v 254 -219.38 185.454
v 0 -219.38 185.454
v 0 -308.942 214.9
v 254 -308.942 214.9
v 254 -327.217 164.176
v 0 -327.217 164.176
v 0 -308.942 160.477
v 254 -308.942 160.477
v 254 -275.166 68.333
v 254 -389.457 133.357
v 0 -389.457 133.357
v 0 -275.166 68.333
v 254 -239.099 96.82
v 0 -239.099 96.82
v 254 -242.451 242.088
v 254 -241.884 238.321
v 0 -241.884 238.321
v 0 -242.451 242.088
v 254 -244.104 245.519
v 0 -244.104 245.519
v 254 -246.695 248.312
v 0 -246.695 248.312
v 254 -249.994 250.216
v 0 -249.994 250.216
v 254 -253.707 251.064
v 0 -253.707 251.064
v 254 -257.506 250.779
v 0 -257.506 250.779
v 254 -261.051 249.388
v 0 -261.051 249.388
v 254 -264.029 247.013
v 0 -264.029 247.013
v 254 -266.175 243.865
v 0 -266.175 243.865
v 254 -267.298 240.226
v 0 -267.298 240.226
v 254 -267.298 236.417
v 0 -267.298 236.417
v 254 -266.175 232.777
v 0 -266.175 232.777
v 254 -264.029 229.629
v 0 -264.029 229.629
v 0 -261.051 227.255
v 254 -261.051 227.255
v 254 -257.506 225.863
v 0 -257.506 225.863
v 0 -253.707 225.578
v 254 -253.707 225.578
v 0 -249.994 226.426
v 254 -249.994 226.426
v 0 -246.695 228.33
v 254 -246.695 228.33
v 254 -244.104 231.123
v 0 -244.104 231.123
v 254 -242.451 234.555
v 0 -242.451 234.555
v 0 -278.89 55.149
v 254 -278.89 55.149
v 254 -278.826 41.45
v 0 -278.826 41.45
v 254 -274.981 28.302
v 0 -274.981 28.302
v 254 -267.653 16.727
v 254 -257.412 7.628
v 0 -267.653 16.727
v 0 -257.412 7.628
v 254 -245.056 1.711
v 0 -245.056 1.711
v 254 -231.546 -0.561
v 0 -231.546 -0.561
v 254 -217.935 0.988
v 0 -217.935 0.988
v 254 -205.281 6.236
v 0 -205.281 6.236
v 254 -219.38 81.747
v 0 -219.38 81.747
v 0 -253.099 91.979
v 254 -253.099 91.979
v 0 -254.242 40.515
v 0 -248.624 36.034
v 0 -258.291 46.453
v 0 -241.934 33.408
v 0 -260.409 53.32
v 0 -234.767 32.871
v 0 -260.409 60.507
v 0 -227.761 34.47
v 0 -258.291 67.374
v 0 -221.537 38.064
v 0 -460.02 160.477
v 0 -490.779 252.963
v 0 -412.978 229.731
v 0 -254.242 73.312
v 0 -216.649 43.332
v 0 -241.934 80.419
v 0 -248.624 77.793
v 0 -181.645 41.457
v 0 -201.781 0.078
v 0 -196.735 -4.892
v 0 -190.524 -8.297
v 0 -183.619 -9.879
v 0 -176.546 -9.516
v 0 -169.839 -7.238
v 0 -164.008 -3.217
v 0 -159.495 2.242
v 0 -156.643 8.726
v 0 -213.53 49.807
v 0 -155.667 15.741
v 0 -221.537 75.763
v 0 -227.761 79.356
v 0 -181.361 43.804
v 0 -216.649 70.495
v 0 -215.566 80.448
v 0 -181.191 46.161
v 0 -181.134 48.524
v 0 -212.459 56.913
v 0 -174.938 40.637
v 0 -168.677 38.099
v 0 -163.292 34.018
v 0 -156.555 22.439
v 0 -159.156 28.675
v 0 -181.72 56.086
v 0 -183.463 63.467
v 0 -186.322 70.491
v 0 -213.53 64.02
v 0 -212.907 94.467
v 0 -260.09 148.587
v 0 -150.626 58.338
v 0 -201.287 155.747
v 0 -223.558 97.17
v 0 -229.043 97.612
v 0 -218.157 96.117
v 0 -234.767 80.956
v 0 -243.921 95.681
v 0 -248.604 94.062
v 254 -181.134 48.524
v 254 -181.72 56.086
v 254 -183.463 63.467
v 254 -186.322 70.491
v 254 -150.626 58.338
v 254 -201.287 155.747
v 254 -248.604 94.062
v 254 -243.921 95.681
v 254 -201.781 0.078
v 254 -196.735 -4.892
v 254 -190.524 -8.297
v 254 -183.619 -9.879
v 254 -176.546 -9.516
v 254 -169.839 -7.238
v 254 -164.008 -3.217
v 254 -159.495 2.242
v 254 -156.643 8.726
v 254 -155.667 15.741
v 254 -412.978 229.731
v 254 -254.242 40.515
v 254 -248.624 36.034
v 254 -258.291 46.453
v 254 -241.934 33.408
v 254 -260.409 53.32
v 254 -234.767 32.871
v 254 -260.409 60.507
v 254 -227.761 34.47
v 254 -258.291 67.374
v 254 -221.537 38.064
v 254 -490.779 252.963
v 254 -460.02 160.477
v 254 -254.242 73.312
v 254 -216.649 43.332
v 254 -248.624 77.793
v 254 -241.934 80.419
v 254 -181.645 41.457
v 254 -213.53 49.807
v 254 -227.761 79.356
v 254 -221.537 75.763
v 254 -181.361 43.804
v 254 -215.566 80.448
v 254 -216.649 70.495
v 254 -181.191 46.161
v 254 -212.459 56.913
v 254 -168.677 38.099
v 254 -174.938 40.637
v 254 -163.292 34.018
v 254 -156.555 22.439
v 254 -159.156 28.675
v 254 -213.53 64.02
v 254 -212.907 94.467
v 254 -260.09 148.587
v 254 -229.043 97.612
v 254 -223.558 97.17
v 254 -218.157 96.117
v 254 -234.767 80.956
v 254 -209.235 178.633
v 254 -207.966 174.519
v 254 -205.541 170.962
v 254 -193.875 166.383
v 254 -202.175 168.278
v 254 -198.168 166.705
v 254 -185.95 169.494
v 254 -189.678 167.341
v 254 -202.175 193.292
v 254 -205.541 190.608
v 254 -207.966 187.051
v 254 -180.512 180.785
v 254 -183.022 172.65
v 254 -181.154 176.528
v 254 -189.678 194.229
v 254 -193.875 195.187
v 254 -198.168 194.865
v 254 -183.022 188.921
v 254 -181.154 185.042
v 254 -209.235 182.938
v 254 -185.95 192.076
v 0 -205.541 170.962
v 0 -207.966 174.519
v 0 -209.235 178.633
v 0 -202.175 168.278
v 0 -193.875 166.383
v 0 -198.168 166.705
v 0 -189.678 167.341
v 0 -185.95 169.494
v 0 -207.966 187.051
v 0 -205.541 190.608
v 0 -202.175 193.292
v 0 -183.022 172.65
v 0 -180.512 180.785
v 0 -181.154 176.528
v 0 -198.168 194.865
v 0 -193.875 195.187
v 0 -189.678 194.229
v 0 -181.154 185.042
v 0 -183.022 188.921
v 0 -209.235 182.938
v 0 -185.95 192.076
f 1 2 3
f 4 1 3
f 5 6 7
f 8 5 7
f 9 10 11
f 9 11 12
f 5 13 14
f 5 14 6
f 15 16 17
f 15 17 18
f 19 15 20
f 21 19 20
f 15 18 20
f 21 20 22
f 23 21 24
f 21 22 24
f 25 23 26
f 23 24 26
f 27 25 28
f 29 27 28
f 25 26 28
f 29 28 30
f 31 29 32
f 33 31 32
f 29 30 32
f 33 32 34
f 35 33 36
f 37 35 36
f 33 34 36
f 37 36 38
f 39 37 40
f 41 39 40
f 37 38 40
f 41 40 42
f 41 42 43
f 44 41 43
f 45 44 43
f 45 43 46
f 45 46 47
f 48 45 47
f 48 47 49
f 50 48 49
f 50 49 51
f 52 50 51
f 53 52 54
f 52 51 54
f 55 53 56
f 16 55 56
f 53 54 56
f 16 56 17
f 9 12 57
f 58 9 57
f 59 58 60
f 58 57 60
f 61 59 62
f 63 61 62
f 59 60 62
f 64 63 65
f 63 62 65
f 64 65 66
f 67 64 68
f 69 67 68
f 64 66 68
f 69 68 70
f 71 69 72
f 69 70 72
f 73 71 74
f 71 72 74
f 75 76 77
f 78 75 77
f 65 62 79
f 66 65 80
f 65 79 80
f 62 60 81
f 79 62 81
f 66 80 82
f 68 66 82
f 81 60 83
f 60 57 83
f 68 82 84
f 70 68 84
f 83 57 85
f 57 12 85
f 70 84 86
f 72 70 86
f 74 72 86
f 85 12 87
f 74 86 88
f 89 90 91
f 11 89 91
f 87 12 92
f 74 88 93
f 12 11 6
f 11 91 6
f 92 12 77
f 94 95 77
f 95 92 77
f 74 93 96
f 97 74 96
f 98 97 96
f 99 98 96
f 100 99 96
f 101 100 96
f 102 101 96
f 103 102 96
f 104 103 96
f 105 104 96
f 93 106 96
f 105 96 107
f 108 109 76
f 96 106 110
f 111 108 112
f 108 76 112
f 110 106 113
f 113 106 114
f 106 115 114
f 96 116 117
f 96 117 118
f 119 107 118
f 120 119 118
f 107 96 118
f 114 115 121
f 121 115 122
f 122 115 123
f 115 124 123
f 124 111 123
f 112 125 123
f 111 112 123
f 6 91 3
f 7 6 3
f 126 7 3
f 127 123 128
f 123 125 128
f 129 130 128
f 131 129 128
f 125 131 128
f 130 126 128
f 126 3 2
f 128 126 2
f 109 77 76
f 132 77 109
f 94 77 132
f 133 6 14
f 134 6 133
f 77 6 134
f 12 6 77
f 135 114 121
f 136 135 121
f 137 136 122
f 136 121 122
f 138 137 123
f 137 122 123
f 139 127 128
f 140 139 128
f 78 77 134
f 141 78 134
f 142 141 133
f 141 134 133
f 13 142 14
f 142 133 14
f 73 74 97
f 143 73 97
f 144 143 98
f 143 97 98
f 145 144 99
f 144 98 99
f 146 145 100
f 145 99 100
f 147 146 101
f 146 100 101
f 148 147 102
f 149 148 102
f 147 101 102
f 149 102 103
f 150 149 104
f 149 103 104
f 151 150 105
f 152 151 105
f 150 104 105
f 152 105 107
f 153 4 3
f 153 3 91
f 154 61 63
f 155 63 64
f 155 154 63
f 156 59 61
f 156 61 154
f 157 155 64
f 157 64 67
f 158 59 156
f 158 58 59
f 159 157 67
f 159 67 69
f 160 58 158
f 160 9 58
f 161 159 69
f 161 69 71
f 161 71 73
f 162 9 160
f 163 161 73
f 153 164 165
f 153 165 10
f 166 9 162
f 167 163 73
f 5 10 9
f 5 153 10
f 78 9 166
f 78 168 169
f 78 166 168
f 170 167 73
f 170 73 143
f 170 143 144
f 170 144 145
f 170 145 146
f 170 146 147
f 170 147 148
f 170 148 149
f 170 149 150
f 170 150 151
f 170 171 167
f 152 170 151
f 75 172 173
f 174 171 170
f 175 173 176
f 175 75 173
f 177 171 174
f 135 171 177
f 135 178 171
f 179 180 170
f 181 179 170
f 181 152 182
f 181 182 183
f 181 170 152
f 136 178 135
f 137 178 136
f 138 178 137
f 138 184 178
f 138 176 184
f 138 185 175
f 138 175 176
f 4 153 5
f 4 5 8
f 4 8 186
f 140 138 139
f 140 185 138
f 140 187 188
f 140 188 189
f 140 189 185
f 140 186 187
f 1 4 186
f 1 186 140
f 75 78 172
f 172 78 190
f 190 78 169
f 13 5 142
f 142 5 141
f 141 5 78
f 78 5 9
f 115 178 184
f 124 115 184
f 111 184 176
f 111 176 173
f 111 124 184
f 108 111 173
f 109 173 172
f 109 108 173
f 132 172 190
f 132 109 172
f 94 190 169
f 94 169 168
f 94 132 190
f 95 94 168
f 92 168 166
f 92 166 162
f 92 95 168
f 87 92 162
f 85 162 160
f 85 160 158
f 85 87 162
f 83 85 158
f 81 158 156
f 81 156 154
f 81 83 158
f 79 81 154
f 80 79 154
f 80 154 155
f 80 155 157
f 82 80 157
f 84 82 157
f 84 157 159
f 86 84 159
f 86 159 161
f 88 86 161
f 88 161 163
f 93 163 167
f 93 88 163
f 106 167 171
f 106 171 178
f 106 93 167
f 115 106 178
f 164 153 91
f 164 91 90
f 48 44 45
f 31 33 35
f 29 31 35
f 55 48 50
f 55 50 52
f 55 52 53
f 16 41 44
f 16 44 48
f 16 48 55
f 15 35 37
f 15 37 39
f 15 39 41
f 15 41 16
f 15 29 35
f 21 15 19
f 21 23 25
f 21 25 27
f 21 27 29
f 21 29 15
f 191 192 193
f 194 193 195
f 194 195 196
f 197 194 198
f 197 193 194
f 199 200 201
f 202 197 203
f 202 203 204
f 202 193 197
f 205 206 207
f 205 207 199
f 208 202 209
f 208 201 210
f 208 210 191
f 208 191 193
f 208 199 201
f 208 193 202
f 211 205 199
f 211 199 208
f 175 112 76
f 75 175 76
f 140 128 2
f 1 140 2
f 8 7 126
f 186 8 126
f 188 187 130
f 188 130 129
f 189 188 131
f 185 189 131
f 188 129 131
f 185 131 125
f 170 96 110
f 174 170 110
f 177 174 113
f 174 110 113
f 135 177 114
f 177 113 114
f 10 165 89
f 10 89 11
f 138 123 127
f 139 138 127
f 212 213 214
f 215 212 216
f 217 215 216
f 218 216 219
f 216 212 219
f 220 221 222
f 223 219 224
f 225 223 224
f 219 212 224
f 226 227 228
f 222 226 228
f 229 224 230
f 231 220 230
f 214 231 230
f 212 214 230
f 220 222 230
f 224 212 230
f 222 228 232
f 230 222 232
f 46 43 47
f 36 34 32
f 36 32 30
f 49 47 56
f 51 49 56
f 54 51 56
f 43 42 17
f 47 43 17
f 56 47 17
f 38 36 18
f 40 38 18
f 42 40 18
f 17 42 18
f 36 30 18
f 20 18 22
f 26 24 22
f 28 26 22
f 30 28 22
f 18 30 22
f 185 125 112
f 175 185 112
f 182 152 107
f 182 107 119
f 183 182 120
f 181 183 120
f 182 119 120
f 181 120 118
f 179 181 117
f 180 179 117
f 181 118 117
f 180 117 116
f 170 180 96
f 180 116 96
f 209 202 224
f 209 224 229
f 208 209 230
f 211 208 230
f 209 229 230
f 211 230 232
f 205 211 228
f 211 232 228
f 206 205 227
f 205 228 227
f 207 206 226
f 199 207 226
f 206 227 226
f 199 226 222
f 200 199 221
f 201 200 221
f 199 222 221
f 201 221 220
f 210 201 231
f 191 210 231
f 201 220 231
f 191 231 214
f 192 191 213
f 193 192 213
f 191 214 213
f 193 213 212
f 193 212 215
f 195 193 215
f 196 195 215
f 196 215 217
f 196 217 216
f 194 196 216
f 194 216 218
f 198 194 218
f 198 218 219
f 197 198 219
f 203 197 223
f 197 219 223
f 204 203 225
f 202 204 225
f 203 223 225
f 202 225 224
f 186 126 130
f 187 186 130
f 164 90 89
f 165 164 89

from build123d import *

# Parameters (mm, degrees)
F0_R     = 24.1095947755
F1_DEPTH = 254
F0_R_2   = 12.7785133022
F0_R_3   = 14.4420909011


with BuildPart() as f1:
    # F0 (on Right) → F1 (new body)
    with BuildSketch(Plane.YZ):
        Polygon((-412.9776954651, 229.7314852476), (-490.7785356045, 252.9627084732), (-401.3037874862, 181.8995006968), align=None)
        Polygon((-401.3037874862, 181.8995006968), (-490.7785356045, 252.9627084732), (-460.0200355053, 160.4773849249), (-389.4565403461, 133.3572864532), align=None)
        Polygon((-412.9776954651, 229.7314852476), (-401.3037874862, 181.8995006968), (-396.6937959194, 178.2381236553), (-327.2165126381, 164.1761440375), align=None)
        with BuildLine():
            Line((-396.6937959194, 178.2381236553), (-401.3037874862, 181.8995006968))
            Line((-401.3037874862, 181.8995006968), (-389.4565403461, 133.3572864532))
            Line((-389.4565403461, 133.3572864532), (-253.0991645965, 91.9789276683))
            ThreePointArc((-253.0991645965, 91.9789276683), (-246.2828425341, 94.9303750999), (-239.0993153958, 96.8198793348))
            Line((-239.0993153958, 96.8198793348), (-327.2165126381, 164.1761440375))
            Line((-327.2165126381, 164.1761440375), (-396.6937959194, 178.2381236553))
        make_face()
        Polygon((-308.9417219162, 214.8996591568), (-412.9776954651, 229.7314852476), (-327.2165126381, 164.1761440375), (-308.9417219162, 160.4773849249), align=None)
        with BuildLine():
            Line((-253.0991645965, 91.9789276683), (-389.4565403461, 133.3572864532))
            Line((-389.4565403461, 133.3572864532), (-275.1655883638, 68.3329063543))
            ThreePointArc((-275.1655883638, 68.3329063543), (-266.1351458231, 82.0248976928), (-253.0991645965, 91.9789276683))
        make_face()
        Polygon((-260.0899934769, 148.5868692398), (-308.9417219162, 214.8996591568), (-308.9417219162, 160.4773849249), align=None)
        Polygon((-219.3802595139, 185.4535496204), (-308.9417219162, 214.8996591568), (-260.0899934769, 148.5868692398), (-254.1415393319, 190.3115506303), (-201.2870460749, 155.74683249), align=None)
        with BuildLine():
            Line((-219.3802595139, 81.7467495799), (-253.0991645965, 91.9789276683))
            ThreePointArc((-253.0991645965, 91.9789276683), (-266.1351458231, 82.0248976928), (-275.1655883638, 68.3329063543))
            ThreePointArc((-275.1655883638, 68.3329063543), (-262.8511867206, 11.8184231885), (-205.2806188906, 6.2362179745))
            ThreePointArc((-205.2806188906, 6.2362179745), (-202.7389873258, 30.0715955347), (-181.6450349187, 41.4571252236))
            ThreePointArc((-181.6450349187, 41.4571252236), (-181.2617972, 44.9813576149), (-181.1338289572, 48.52405563))
            ThreePointArc((-181.1338289572, 48.52405563), (-182.4484000439, 59.8098424753), (-186.3217257629, 70.4913418895))
            Line((-186.3217257629, 70.4913418895), (-215.5657344576, 80.4480218451))
            Line((-215.5657344576, 80.4480218451), (-219.3802595139, 81.7467495799))
        make_face()
        with Locations((-236.5688234568, 56.9134391844)):
            Circle(F0_R, mode=Mode.SUBTRACT)
        with BuildLine():
            Line((-201.2870460749, 155.74683249), (-260.0899934769, 148.5868692398))
            Line((-260.0899934769, 148.5868692398), (-229.0431203965, 97.6119178034))
            ThreePointArc((-229.0431203965, 97.6119178034), (-220.8426901154, 96.7195308064), (-212.9073592029, 94.4669912047))
            Line((-212.9073592029, 94.4669912047), (-201.2870460749, 155.74683249))
        make_face()
        Polygon((-254.1415393319, 190.3115506303), (-260.0899934769, 148.5868692398), (-201.2870460749, 155.74683249), align=None)
        with BuildLine():
            ThreePointArc((-181.6450349187, 41.4571252236), (-189.4635480745, 21.1628880739), (-205.2806188906, 6.2362179745))
            ThreePointArc((-205.2806188906, 6.2362179745), (-176.5455247451, -9.5164689386), (-155.6673680615, 15.7413091511))
            ThreePointArc((-155.6673680615, 15.7413091511), (-163.2920888612, 34.0179497862), (-181.6450349187, 41.4571252236))
        make_face()
        with BuildLine():
            ThreePointArc((-181.6450349187, 41.4571252236), (-202.7389873258, 30.0715955347), (-205.2806188906, 6.2362179745))
            ThreePointArc((-205.2806188906, 6.2362179745), (-189.4635480745, 21.1628880739), (-181.6450349187, 41.4571252236))
        make_face()
        with BuildLine():
            Line((-150.6260484457, 58.3380684257), (-201.2870460749, 155.74683249))
            Line((-201.2870460749, 155.74683249), (-212.9073592029, 94.4669912047))
            ThreePointArc((-212.9073592029, 94.4669912047), (-197.3516457938, 84.9884016922), (-186.3217257629, 70.4913418895))
            Line((-186.3217257629, 70.4913418895), (-150.6260484457, 58.3380684257))
        make_face()
        with BuildLine():
            Line((-212.9073592029, 94.4669912047), (-215.5657344576, 80.4480218451))
            Line((-215.5657344576, 80.4480218451), (-186.3217257629, 70.4913418895))
            ThreePointArc((-186.3217257629, 70.4913418895), (-197.3516457938, 84.9884016922), (-212.9073592029, 94.4669912047))
        make_face()
    extrude(amount=F1_DEPTH)


with BuildPart() as f1b:
    # F0 (on Right) → F1, piece 2 (new body)
    with BuildSketch(Plane.YZ):
        with Locations((-254.6620368958, 238.3210808039)):
            Circle(F0_R_2)
    extrude(amount=F1_DEPTH)


with BuildPart() as f1c:
    # F0 (on Right) → F1, piece 3 (new body)
    with BuildSketch(Plane.YZ):
        with Locations((-194.9544250965, 180.7850450277)):
            Circle(F0_R_3)
    extrude(amount=F1_DEPTH)


solid = Compound([f1.part, f1b.part, f1c.part])
